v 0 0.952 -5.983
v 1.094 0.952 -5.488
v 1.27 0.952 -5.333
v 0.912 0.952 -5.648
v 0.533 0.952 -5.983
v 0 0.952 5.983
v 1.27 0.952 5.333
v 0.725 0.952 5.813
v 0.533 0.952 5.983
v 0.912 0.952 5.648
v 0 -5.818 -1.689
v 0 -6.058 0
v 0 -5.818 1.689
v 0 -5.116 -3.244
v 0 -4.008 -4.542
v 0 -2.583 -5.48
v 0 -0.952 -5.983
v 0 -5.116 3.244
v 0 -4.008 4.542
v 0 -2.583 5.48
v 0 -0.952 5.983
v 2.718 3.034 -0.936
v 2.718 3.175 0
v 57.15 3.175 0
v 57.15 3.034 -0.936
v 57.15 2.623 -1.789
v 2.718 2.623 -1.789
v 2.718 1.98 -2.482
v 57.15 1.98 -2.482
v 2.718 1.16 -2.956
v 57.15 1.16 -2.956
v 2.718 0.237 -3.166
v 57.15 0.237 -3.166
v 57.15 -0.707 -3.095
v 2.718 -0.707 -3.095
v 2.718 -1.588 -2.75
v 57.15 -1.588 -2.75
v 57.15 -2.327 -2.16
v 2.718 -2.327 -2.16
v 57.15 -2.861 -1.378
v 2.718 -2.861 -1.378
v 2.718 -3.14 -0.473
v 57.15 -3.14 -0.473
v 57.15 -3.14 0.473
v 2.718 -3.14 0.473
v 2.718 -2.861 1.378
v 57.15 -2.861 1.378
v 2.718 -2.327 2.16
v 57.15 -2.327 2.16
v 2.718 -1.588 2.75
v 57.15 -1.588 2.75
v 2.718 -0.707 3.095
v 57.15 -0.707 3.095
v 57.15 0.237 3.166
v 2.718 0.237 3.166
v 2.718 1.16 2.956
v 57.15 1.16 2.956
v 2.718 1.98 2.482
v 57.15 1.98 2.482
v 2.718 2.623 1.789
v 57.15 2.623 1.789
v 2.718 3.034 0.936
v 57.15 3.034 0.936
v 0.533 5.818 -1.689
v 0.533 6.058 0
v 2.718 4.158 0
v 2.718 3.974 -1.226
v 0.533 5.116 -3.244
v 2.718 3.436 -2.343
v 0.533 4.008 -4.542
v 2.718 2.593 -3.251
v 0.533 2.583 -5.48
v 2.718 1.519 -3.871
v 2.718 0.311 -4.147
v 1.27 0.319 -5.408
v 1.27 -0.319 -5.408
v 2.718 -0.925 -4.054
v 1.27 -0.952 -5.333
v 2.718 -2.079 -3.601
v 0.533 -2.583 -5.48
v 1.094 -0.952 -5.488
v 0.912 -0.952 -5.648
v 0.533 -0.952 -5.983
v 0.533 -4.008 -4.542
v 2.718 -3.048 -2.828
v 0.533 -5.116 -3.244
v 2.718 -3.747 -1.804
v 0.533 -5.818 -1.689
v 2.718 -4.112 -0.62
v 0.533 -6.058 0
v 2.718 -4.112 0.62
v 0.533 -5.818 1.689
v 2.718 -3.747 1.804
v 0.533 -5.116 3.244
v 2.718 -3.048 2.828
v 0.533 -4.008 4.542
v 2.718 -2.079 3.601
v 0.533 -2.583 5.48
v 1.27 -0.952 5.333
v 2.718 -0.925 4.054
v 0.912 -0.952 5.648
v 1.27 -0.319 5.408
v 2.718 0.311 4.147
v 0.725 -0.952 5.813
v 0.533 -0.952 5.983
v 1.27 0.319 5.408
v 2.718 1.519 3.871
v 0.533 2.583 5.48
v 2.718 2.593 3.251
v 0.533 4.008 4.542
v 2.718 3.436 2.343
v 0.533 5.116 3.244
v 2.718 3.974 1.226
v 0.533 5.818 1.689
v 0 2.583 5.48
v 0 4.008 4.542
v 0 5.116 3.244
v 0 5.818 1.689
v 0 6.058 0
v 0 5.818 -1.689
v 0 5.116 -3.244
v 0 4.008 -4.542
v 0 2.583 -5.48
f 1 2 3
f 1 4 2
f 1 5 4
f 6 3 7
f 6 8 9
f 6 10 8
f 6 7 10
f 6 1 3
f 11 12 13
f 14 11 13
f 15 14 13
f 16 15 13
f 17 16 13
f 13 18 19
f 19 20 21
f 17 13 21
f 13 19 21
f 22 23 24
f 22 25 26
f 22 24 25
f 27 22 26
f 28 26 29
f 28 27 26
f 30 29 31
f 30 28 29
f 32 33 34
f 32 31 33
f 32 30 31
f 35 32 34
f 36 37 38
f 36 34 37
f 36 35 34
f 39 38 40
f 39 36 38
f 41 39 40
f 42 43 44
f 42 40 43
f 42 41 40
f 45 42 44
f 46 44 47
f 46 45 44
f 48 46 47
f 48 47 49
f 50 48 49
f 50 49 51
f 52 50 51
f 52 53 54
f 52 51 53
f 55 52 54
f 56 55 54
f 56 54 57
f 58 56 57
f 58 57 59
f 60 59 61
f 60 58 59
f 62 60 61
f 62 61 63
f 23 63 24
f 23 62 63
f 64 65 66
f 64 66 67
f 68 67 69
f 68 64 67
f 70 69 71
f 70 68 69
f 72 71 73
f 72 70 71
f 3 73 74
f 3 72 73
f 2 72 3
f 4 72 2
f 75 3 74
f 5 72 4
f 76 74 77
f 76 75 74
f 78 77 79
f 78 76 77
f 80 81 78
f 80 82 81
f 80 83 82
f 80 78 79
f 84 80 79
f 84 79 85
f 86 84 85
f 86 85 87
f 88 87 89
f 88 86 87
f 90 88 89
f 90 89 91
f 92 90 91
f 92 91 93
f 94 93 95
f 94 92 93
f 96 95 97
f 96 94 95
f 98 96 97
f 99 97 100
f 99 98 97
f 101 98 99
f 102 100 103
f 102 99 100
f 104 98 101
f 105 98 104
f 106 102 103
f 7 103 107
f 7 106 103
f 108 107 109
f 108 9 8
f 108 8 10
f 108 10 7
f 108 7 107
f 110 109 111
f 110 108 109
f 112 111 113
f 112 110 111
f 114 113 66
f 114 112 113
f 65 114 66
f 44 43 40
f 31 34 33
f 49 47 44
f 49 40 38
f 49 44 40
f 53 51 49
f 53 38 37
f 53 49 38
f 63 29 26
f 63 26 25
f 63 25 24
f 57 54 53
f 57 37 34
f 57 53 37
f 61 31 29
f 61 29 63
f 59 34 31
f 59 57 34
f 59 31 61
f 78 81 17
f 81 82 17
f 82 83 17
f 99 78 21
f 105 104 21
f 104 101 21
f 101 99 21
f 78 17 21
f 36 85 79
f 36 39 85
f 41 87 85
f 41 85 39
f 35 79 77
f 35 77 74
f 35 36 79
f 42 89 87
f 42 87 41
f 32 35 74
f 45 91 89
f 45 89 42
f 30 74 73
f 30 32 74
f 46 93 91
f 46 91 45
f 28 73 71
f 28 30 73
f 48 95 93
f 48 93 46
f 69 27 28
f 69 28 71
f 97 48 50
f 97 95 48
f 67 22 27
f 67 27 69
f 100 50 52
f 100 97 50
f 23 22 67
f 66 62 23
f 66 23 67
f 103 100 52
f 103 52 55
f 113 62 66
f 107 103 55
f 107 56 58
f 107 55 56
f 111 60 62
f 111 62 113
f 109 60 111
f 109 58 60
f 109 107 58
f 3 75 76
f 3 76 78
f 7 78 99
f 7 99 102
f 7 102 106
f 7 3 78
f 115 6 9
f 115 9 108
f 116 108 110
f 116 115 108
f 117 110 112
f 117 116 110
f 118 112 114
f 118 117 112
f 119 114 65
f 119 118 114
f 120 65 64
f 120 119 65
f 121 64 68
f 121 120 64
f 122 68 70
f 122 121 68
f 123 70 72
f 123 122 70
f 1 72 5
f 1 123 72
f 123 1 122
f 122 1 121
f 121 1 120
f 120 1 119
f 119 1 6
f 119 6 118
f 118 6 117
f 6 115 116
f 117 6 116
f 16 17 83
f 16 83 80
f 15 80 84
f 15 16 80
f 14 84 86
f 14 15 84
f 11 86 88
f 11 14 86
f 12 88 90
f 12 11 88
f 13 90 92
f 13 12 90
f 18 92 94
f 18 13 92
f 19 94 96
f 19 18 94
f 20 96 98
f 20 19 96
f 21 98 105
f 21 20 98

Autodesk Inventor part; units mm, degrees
ref_plane "YZ Plane" through (0, 0, 0) normal (1, 0, 0) x (0, 1, 0)
ref_plane "XZ Plane" through (0, 0, 0) normal (0, 1, 0) x (-1, 0, 0)
sketch "Sketch1" plane through (0, 0, 0) normal (0, 0, 1) x (1, 0, 0)
  line L0 (-11.43, 0) -> (68.58, 0) projected
  line L1 (0, 0) -> (57.15, 0)
  line L2 (57.15, 0) -> (57.15, 3.175)
  line L3 (57.15, 3.175) -> (5.8928, 3.175)
  line L4 (5.8928, 3.175) -> (4.4826, 3.175)
  line L5 (4.4826, 3.175) -> (2.7178, 3.175)
  line L6 (2.7178, 3.175) -> (2.7178, 4.1584)
  line L7 (2.7178, 4.1584) -> (0.5327, 6.0579)
  line L8 (0.5327, 6.0579) -> (0, 6.0579)
  line L9 (0, 6.0579) -> (0, 0)
  line L10 (0, -1.2116) -> (0, 7.2695) projected
  line L11 (5.8928, 3.175) -> (2.7178, 3.175) construction
  dimension "d2" = 57.15
  dimension "d3" = 2.7178
  dimension "d4" = 51.2572
  dimension "d5" = 1.4102
  dimension "d6" = 6.35
  dimension "d7" = 6.35
  dimension "d8" = 8.3168
  dimension "d9" = 12.1158
  dimension "d10" = 41
revolve "Body" add sketch "Sketch1" angle 360 about axis through (0, 0, 0) along (1, 0, 0)
sketch "Sketch2" plane through (0, 0, 0) normal (-1, 0, 0) x (0, 0, 1)
  circle A0 centre (0, 0) radius 6.0579 projected
  line L0 (-8.4811, 0) -> (8.4811, 0) projected
  line L1 (-6.0579, 0) -> (-6.0579, 0.9525)
  line L2 (-6.0579, 0.9525) -> (6.0579, 0.9525)
  line L3 (6.0579, 0) -> (6.0579, 0.9525)
  line L4 (-6.0579, 0) -> (-6.0579, -0.9525)
  line L5 (-6.0579, -0.9525) -> (6.0579, -0.9525)
  line L6 (6.0579, 0) -> (6.0579, -0.9525)
  dimension "d15" = 1.905
extrude "Slot" cut sketch "Sketch2" against normal blind 1.27 contours L0 A0 L2 | L6 L5 A0 | A0 L5 L0 | A0 L2 L3 | L1 L2 A0 | A0 L5 L4
thread "Thread" size "1/4-20 UNC" class "2A" standard "ANSI Unified Screw Threads" length 51.2572
ref_plane "Work Plane1" through (7.5584, 0, 0) normal (0, 0, -1) x (1, 0, 0)
equation "\"d2\" = NLG"
equation "\"d3\" = KOH"
equation "\"d4\" = GEL"
equation "\"d5\" = GAL"
equation "\"d6\" = GD"
equation "\"d7\" = BDM"
equation "\"d8\" = KOD1"
equation "\"d9\" = KOD"
equation "\"d10\" = 0.5 * SEWI"
equation "\"d15\" = SBR"
equation "\"d16\" = STI"
equation "\"d12\" = GEL"
equation "\"NND\" = 6.35"
equation "\"NLG\" = 57.15"
equation "\"GEL\" = 51.2572"
equation "\"KOH\" = 2.7178"
equation "\"KOD\" = 12.1158"
equation "\"SBR\" = 1.905"
equation "\"STI\" = 1.27"
equation "\"GAL\" = 1.41021"
equation "\"SPD\" = 4.445"
equation "\"GD\" = NND"
equation "\"KOD1\" = 8.3168"
equation "\"BDM\" = NND"
equation "\"SEWI\" = 82deg"
equation "\"GUL\" = 0.0254"
equation "\"THREADDIA\" = 6.35"
equation "\"TOA\" = 30deg"
equation "\"GD1\" = SPD"
properties part number "ANSI B18.6.3 - 1/4-20 UNC x 2.25, SUFCHMSI" material "Steel, Mild"
